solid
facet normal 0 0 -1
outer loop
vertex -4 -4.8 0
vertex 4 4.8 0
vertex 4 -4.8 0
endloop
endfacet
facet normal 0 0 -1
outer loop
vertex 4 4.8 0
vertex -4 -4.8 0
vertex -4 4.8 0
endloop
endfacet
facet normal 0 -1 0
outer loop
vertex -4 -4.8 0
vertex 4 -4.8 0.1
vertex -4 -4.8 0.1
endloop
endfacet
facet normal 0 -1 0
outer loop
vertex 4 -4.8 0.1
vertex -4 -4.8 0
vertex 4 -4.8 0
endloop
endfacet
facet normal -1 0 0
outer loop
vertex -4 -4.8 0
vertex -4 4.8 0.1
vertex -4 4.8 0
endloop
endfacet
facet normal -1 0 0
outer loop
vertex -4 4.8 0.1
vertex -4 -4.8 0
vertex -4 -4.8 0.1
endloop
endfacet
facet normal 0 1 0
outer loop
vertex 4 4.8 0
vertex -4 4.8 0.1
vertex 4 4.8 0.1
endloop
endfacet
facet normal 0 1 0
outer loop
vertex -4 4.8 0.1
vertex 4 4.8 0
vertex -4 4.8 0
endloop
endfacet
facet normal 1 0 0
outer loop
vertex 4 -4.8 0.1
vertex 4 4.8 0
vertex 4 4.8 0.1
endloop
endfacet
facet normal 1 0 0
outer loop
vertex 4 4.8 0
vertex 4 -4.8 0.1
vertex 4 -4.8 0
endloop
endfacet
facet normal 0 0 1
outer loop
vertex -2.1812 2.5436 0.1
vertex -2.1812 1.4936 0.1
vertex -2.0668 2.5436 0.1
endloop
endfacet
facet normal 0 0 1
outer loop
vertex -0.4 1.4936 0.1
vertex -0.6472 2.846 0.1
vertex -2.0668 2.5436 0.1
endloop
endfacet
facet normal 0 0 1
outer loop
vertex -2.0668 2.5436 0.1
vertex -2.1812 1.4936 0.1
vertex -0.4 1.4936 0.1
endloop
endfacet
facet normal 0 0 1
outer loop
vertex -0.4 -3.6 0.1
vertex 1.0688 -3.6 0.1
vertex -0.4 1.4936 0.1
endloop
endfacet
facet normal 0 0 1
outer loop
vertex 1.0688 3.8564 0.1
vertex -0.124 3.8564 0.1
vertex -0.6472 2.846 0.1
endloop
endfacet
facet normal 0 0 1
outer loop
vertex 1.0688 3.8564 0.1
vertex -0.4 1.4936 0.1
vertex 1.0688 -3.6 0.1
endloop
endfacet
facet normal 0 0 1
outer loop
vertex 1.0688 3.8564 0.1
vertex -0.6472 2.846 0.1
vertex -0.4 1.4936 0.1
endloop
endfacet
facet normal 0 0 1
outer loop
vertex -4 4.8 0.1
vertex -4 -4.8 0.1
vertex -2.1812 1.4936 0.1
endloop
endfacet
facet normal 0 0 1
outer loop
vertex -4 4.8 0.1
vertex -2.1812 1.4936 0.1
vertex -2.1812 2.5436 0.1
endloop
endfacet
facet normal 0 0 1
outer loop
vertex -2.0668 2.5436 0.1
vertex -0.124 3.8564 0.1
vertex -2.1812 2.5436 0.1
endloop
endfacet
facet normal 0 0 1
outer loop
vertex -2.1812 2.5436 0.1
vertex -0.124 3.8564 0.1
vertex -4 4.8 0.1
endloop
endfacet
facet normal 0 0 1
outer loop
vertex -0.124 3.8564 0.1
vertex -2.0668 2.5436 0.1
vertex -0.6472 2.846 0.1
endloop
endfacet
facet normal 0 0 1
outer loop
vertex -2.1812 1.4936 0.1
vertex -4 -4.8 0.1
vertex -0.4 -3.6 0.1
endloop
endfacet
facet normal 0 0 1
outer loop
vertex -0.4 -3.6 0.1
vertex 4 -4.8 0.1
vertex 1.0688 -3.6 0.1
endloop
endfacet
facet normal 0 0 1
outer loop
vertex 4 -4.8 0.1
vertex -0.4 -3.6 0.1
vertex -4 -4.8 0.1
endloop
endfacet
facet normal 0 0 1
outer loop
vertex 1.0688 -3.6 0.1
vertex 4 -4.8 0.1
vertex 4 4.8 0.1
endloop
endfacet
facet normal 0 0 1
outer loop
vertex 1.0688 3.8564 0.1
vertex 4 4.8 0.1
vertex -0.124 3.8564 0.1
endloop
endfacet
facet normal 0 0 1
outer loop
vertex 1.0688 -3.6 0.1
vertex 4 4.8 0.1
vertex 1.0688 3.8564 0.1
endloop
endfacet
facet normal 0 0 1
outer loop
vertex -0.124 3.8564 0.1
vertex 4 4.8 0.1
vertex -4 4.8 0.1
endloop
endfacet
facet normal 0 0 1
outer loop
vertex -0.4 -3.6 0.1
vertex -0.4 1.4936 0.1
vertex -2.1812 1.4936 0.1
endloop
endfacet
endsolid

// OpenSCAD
// file: ../p/box5-12.scad
use <../lib.scad>
function ldraw_lib__box5_12() = [
// 0 Box with 5 Faces without Any Edges
// 0 Name: box5-12.dat
// 0 Author: Chris Dee [cwdee]
// 0 !LDRAW_ORG Primitive UPDATE 2009-02
// 0 !LICENSE Licensed under CC BY 4.0 : see CAreadme.txt
// 
// 0 BFC CERTIFY CCW
  [0,"BFC","CERTIFY"],
  [0,"BFC","CCW"],
// 
// 0 !HISTORY 2009-09-03 [PTadmin] Official Update 2009-02
// 
// 
// 4 16 1 1 1 1 1 -1 -1 1 -1 -1 1 1
  [4,16,1,1,1,1,1,-1,-1,1,-1,-1,1,1],
// 4 16 -1 0 1 1 0 1 1 1 1 -1 1 1
  [4,16,-1,0,1,1,0,1,1,1,1,-1,1,1],
// 4 16 -1 0 -1 -1 0 1 -1 1 1 -1 1 -1
  [4,16,-1,0,-1,-1,0,1,-1,1,1,-1,1,-1],
// 4 16 1 0 -1 -1 0 -1 -1 1 -1 1 1 -1
  [4,16,1,0,-1,-1,0,-1,-1,1,-1,1,1,-1],
// 4 16 1 0 1 1 0 -1 1 1 -1 1 1 1
  [4,16,1,0,1,1,0,-1,1,1,-1,1,1,1],
// 0
];
module ldraw_lib__box5_12(step=0, col=false, unit=2/5, alt=false, line=0.2, solid=!$preview)
    makepoly(ldraw_lib__box5_12(), step=step, col=col, unit=unit, alt=alt, line=line, solid=solid);
ldraw_lib__box5_12(line=0.2);
// main file
use <../lib.scad>
use <../p/box5-12.scad>
function ldraw_lib__191888c() = [
// 0 Sticker  1.2 x  1 with White "1"
// 0 Name: 191888c.dat
// 0 Author: Steffen [Steffen]
// 0 !LDRAW_ORG Part UPDATE 2012-01
// 0 !LICENSE Licensed under CC BY 4.0 : see CAreadme.txt
// 
// 0 BFC CERTIFY CCW
  [0,"BFC","CERTIFY"],
  [0,"BFC","CCW"],
// 
// 0 !KEYWORDS set 7710
// 
// 0 !HISTORY 2012-03-30 [PTadmin] Official Update 2012-01
// 
// 
// 1 16 0 -0.25 0 10 0 0 0 0.25 0 0 0 -12 box5-12.dat
  [1,16,0,-0.25,0,10,0,0,0,0.25,0,0,0,-12, ldraw_lib__box5_12()],
// 3 15 -5.453 -0.25 6.359 -5.453 -0.25 3.734 -5.167 -0.25 6.359
  [3,15,-5.453,-0.25,6.359,-5.453,-0.25,3.734,-5.167,-0.25,6.359],
// 3 15 -1 -0.25 3.734 -1.618 -0.25 7.115 -5.167 -0.25 6.359
  [3,15,-1,-0.25,3.734,-1.618,-0.25,7.115,-5.167,-0.25,6.359],
// 3 15 -5.167 -0.25 6.359 -5.453 -0.25 3.734 -1 -0.25 3.734
  [3,15,-5.167,-0.25,6.359,-5.453,-0.25,3.734,-1,-0.25,3.734],
// 3 15 -1 -0.25 -9 2.672 -0.25 -9 -1 -0.25 3.734
  [3,15,-1,-0.25,-9,2.672,-0.25,-9,-1,-0.25,3.734],
// 3 15 2.672 -0.25 9.641 -0.31 -0.25 9.641 -1.618 -0.25 7.115
  [3,15,2.672,-0.25,9.641,-0.31,-0.25,9.641,-1.618,-0.25,7.115],
// 3 15 2.672 -0.25 9.641 -1 -0.25 3.734 2.672 -0.25 -9
  [3,15,2.672,-0.25,9.641,-1,-0.25,3.734,2.672,-0.25,-9],
// 3 15 2.672 -0.25 9.641 -1.618 -0.25 7.115 -1 -0.25 3.734
  [3,15,2.672,-0.25,9.641,-1.618,-0.25,7.115,-1,-0.25,3.734],
// 3 16 -10 -0.25 12 -10 -0.25 -12 -5.453 -0.25 3.734
  [3,16,-10,-0.25,12,-10,-0.25,-12,-5.453,-0.25,3.734],
// 3 16 -10 -0.25 12 -5.453 -0.25 3.734 -5.453 -0.25 6.359
  [3,16,-10,-0.25,12,-5.453,-0.25,3.734,-5.453,-0.25,6.359],
// 3 16 -5.167 -0.25 6.359 -0.31 -0.25 9.641 -5.453 -0.25 6.359
  [3,16,-5.167,-0.25,6.359,-0.31,-0.25,9.641,-5.453,-0.25,6.359],
// 3 16 -5.453 -0.25 6.359 -0.31 -0.25 9.641 -10 -0.25 12
  [3,16,-5.453,-0.25,6.359,-0.31,-0.25,9.641,-10,-0.25,12],
// 3 16 -0.31 -0.25 9.641 -5.167 -0.25 6.359 -1.618 -0.25 7.115
  [3,16,-0.31,-0.25,9.641,-5.167,-0.25,6.359,-1.618,-0.25,7.115],
// 3 16 -5.453 -0.25 3.734 -10 -0.25 -12 -1 -0.25 -9
  [3,16,-5.453,-0.25,3.734,-10,-0.25,-12,-1,-0.25,-9],
// 3 16 -1 -0.25 -9 10 -0.25 -12 2.672 -0.25 -9
  [3,16,-1,-0.25,-9,10,-0.25,-12,2.672,-0.25,-9],
// 3 16 10 -0.25 -12 -1 -0.25 -9 -10 -0.25 -12
  [3,16,10,-0.25,-12,-1,-0.25,-9,-10,-0.25,-12],
// 3 16 2.672 -0.25 -9 10 -0.25 -12 10 -0.25 12
  [3,16,2.672,-0.25,-9,10,-0.25,-12,10,-0.25,12],
// 3 16 2.672 -0.25 9.641 10 -0.25 12 -0.31 -0.25 9.641
  [3,16,2.672,-0.25,9.641,10,-0.25,12,-0.31,-0.25,9.641],
// 3 16 2.672 -0.25 -9 10 -0.25 12 2.672 -0.25 9.641
  [3,16,2.672,-0.25,-9,10,-0.25,12,2.672,-0.25,9.641],
// 3 16 -0.31 -0.25 9.641 10 -0.25 12 -10 -0.25 12
  [3,16,-0.31,-0.25,9.641,10,-0.25,12,-10,-0.25,12],
// 3 16 -1 -0.25 -9 -1 -0.25 3.734 -5.453 -0.25 3.734
  [3,16,-1,-0.25,-9,-1,-0.25,3.734,-5.453,-0.25,3.734],
];
module ldraw_lib__191888c(step=0, col=false, unit=2/5, alt=false, line=0.2, solid=!$preview)
    makepoly(ldraw_lib__191888c(), step=step, col=col, unit=unit, alt=alt, line=line, solid=solid);
ldraw_lib__191888c(line=0.2);
